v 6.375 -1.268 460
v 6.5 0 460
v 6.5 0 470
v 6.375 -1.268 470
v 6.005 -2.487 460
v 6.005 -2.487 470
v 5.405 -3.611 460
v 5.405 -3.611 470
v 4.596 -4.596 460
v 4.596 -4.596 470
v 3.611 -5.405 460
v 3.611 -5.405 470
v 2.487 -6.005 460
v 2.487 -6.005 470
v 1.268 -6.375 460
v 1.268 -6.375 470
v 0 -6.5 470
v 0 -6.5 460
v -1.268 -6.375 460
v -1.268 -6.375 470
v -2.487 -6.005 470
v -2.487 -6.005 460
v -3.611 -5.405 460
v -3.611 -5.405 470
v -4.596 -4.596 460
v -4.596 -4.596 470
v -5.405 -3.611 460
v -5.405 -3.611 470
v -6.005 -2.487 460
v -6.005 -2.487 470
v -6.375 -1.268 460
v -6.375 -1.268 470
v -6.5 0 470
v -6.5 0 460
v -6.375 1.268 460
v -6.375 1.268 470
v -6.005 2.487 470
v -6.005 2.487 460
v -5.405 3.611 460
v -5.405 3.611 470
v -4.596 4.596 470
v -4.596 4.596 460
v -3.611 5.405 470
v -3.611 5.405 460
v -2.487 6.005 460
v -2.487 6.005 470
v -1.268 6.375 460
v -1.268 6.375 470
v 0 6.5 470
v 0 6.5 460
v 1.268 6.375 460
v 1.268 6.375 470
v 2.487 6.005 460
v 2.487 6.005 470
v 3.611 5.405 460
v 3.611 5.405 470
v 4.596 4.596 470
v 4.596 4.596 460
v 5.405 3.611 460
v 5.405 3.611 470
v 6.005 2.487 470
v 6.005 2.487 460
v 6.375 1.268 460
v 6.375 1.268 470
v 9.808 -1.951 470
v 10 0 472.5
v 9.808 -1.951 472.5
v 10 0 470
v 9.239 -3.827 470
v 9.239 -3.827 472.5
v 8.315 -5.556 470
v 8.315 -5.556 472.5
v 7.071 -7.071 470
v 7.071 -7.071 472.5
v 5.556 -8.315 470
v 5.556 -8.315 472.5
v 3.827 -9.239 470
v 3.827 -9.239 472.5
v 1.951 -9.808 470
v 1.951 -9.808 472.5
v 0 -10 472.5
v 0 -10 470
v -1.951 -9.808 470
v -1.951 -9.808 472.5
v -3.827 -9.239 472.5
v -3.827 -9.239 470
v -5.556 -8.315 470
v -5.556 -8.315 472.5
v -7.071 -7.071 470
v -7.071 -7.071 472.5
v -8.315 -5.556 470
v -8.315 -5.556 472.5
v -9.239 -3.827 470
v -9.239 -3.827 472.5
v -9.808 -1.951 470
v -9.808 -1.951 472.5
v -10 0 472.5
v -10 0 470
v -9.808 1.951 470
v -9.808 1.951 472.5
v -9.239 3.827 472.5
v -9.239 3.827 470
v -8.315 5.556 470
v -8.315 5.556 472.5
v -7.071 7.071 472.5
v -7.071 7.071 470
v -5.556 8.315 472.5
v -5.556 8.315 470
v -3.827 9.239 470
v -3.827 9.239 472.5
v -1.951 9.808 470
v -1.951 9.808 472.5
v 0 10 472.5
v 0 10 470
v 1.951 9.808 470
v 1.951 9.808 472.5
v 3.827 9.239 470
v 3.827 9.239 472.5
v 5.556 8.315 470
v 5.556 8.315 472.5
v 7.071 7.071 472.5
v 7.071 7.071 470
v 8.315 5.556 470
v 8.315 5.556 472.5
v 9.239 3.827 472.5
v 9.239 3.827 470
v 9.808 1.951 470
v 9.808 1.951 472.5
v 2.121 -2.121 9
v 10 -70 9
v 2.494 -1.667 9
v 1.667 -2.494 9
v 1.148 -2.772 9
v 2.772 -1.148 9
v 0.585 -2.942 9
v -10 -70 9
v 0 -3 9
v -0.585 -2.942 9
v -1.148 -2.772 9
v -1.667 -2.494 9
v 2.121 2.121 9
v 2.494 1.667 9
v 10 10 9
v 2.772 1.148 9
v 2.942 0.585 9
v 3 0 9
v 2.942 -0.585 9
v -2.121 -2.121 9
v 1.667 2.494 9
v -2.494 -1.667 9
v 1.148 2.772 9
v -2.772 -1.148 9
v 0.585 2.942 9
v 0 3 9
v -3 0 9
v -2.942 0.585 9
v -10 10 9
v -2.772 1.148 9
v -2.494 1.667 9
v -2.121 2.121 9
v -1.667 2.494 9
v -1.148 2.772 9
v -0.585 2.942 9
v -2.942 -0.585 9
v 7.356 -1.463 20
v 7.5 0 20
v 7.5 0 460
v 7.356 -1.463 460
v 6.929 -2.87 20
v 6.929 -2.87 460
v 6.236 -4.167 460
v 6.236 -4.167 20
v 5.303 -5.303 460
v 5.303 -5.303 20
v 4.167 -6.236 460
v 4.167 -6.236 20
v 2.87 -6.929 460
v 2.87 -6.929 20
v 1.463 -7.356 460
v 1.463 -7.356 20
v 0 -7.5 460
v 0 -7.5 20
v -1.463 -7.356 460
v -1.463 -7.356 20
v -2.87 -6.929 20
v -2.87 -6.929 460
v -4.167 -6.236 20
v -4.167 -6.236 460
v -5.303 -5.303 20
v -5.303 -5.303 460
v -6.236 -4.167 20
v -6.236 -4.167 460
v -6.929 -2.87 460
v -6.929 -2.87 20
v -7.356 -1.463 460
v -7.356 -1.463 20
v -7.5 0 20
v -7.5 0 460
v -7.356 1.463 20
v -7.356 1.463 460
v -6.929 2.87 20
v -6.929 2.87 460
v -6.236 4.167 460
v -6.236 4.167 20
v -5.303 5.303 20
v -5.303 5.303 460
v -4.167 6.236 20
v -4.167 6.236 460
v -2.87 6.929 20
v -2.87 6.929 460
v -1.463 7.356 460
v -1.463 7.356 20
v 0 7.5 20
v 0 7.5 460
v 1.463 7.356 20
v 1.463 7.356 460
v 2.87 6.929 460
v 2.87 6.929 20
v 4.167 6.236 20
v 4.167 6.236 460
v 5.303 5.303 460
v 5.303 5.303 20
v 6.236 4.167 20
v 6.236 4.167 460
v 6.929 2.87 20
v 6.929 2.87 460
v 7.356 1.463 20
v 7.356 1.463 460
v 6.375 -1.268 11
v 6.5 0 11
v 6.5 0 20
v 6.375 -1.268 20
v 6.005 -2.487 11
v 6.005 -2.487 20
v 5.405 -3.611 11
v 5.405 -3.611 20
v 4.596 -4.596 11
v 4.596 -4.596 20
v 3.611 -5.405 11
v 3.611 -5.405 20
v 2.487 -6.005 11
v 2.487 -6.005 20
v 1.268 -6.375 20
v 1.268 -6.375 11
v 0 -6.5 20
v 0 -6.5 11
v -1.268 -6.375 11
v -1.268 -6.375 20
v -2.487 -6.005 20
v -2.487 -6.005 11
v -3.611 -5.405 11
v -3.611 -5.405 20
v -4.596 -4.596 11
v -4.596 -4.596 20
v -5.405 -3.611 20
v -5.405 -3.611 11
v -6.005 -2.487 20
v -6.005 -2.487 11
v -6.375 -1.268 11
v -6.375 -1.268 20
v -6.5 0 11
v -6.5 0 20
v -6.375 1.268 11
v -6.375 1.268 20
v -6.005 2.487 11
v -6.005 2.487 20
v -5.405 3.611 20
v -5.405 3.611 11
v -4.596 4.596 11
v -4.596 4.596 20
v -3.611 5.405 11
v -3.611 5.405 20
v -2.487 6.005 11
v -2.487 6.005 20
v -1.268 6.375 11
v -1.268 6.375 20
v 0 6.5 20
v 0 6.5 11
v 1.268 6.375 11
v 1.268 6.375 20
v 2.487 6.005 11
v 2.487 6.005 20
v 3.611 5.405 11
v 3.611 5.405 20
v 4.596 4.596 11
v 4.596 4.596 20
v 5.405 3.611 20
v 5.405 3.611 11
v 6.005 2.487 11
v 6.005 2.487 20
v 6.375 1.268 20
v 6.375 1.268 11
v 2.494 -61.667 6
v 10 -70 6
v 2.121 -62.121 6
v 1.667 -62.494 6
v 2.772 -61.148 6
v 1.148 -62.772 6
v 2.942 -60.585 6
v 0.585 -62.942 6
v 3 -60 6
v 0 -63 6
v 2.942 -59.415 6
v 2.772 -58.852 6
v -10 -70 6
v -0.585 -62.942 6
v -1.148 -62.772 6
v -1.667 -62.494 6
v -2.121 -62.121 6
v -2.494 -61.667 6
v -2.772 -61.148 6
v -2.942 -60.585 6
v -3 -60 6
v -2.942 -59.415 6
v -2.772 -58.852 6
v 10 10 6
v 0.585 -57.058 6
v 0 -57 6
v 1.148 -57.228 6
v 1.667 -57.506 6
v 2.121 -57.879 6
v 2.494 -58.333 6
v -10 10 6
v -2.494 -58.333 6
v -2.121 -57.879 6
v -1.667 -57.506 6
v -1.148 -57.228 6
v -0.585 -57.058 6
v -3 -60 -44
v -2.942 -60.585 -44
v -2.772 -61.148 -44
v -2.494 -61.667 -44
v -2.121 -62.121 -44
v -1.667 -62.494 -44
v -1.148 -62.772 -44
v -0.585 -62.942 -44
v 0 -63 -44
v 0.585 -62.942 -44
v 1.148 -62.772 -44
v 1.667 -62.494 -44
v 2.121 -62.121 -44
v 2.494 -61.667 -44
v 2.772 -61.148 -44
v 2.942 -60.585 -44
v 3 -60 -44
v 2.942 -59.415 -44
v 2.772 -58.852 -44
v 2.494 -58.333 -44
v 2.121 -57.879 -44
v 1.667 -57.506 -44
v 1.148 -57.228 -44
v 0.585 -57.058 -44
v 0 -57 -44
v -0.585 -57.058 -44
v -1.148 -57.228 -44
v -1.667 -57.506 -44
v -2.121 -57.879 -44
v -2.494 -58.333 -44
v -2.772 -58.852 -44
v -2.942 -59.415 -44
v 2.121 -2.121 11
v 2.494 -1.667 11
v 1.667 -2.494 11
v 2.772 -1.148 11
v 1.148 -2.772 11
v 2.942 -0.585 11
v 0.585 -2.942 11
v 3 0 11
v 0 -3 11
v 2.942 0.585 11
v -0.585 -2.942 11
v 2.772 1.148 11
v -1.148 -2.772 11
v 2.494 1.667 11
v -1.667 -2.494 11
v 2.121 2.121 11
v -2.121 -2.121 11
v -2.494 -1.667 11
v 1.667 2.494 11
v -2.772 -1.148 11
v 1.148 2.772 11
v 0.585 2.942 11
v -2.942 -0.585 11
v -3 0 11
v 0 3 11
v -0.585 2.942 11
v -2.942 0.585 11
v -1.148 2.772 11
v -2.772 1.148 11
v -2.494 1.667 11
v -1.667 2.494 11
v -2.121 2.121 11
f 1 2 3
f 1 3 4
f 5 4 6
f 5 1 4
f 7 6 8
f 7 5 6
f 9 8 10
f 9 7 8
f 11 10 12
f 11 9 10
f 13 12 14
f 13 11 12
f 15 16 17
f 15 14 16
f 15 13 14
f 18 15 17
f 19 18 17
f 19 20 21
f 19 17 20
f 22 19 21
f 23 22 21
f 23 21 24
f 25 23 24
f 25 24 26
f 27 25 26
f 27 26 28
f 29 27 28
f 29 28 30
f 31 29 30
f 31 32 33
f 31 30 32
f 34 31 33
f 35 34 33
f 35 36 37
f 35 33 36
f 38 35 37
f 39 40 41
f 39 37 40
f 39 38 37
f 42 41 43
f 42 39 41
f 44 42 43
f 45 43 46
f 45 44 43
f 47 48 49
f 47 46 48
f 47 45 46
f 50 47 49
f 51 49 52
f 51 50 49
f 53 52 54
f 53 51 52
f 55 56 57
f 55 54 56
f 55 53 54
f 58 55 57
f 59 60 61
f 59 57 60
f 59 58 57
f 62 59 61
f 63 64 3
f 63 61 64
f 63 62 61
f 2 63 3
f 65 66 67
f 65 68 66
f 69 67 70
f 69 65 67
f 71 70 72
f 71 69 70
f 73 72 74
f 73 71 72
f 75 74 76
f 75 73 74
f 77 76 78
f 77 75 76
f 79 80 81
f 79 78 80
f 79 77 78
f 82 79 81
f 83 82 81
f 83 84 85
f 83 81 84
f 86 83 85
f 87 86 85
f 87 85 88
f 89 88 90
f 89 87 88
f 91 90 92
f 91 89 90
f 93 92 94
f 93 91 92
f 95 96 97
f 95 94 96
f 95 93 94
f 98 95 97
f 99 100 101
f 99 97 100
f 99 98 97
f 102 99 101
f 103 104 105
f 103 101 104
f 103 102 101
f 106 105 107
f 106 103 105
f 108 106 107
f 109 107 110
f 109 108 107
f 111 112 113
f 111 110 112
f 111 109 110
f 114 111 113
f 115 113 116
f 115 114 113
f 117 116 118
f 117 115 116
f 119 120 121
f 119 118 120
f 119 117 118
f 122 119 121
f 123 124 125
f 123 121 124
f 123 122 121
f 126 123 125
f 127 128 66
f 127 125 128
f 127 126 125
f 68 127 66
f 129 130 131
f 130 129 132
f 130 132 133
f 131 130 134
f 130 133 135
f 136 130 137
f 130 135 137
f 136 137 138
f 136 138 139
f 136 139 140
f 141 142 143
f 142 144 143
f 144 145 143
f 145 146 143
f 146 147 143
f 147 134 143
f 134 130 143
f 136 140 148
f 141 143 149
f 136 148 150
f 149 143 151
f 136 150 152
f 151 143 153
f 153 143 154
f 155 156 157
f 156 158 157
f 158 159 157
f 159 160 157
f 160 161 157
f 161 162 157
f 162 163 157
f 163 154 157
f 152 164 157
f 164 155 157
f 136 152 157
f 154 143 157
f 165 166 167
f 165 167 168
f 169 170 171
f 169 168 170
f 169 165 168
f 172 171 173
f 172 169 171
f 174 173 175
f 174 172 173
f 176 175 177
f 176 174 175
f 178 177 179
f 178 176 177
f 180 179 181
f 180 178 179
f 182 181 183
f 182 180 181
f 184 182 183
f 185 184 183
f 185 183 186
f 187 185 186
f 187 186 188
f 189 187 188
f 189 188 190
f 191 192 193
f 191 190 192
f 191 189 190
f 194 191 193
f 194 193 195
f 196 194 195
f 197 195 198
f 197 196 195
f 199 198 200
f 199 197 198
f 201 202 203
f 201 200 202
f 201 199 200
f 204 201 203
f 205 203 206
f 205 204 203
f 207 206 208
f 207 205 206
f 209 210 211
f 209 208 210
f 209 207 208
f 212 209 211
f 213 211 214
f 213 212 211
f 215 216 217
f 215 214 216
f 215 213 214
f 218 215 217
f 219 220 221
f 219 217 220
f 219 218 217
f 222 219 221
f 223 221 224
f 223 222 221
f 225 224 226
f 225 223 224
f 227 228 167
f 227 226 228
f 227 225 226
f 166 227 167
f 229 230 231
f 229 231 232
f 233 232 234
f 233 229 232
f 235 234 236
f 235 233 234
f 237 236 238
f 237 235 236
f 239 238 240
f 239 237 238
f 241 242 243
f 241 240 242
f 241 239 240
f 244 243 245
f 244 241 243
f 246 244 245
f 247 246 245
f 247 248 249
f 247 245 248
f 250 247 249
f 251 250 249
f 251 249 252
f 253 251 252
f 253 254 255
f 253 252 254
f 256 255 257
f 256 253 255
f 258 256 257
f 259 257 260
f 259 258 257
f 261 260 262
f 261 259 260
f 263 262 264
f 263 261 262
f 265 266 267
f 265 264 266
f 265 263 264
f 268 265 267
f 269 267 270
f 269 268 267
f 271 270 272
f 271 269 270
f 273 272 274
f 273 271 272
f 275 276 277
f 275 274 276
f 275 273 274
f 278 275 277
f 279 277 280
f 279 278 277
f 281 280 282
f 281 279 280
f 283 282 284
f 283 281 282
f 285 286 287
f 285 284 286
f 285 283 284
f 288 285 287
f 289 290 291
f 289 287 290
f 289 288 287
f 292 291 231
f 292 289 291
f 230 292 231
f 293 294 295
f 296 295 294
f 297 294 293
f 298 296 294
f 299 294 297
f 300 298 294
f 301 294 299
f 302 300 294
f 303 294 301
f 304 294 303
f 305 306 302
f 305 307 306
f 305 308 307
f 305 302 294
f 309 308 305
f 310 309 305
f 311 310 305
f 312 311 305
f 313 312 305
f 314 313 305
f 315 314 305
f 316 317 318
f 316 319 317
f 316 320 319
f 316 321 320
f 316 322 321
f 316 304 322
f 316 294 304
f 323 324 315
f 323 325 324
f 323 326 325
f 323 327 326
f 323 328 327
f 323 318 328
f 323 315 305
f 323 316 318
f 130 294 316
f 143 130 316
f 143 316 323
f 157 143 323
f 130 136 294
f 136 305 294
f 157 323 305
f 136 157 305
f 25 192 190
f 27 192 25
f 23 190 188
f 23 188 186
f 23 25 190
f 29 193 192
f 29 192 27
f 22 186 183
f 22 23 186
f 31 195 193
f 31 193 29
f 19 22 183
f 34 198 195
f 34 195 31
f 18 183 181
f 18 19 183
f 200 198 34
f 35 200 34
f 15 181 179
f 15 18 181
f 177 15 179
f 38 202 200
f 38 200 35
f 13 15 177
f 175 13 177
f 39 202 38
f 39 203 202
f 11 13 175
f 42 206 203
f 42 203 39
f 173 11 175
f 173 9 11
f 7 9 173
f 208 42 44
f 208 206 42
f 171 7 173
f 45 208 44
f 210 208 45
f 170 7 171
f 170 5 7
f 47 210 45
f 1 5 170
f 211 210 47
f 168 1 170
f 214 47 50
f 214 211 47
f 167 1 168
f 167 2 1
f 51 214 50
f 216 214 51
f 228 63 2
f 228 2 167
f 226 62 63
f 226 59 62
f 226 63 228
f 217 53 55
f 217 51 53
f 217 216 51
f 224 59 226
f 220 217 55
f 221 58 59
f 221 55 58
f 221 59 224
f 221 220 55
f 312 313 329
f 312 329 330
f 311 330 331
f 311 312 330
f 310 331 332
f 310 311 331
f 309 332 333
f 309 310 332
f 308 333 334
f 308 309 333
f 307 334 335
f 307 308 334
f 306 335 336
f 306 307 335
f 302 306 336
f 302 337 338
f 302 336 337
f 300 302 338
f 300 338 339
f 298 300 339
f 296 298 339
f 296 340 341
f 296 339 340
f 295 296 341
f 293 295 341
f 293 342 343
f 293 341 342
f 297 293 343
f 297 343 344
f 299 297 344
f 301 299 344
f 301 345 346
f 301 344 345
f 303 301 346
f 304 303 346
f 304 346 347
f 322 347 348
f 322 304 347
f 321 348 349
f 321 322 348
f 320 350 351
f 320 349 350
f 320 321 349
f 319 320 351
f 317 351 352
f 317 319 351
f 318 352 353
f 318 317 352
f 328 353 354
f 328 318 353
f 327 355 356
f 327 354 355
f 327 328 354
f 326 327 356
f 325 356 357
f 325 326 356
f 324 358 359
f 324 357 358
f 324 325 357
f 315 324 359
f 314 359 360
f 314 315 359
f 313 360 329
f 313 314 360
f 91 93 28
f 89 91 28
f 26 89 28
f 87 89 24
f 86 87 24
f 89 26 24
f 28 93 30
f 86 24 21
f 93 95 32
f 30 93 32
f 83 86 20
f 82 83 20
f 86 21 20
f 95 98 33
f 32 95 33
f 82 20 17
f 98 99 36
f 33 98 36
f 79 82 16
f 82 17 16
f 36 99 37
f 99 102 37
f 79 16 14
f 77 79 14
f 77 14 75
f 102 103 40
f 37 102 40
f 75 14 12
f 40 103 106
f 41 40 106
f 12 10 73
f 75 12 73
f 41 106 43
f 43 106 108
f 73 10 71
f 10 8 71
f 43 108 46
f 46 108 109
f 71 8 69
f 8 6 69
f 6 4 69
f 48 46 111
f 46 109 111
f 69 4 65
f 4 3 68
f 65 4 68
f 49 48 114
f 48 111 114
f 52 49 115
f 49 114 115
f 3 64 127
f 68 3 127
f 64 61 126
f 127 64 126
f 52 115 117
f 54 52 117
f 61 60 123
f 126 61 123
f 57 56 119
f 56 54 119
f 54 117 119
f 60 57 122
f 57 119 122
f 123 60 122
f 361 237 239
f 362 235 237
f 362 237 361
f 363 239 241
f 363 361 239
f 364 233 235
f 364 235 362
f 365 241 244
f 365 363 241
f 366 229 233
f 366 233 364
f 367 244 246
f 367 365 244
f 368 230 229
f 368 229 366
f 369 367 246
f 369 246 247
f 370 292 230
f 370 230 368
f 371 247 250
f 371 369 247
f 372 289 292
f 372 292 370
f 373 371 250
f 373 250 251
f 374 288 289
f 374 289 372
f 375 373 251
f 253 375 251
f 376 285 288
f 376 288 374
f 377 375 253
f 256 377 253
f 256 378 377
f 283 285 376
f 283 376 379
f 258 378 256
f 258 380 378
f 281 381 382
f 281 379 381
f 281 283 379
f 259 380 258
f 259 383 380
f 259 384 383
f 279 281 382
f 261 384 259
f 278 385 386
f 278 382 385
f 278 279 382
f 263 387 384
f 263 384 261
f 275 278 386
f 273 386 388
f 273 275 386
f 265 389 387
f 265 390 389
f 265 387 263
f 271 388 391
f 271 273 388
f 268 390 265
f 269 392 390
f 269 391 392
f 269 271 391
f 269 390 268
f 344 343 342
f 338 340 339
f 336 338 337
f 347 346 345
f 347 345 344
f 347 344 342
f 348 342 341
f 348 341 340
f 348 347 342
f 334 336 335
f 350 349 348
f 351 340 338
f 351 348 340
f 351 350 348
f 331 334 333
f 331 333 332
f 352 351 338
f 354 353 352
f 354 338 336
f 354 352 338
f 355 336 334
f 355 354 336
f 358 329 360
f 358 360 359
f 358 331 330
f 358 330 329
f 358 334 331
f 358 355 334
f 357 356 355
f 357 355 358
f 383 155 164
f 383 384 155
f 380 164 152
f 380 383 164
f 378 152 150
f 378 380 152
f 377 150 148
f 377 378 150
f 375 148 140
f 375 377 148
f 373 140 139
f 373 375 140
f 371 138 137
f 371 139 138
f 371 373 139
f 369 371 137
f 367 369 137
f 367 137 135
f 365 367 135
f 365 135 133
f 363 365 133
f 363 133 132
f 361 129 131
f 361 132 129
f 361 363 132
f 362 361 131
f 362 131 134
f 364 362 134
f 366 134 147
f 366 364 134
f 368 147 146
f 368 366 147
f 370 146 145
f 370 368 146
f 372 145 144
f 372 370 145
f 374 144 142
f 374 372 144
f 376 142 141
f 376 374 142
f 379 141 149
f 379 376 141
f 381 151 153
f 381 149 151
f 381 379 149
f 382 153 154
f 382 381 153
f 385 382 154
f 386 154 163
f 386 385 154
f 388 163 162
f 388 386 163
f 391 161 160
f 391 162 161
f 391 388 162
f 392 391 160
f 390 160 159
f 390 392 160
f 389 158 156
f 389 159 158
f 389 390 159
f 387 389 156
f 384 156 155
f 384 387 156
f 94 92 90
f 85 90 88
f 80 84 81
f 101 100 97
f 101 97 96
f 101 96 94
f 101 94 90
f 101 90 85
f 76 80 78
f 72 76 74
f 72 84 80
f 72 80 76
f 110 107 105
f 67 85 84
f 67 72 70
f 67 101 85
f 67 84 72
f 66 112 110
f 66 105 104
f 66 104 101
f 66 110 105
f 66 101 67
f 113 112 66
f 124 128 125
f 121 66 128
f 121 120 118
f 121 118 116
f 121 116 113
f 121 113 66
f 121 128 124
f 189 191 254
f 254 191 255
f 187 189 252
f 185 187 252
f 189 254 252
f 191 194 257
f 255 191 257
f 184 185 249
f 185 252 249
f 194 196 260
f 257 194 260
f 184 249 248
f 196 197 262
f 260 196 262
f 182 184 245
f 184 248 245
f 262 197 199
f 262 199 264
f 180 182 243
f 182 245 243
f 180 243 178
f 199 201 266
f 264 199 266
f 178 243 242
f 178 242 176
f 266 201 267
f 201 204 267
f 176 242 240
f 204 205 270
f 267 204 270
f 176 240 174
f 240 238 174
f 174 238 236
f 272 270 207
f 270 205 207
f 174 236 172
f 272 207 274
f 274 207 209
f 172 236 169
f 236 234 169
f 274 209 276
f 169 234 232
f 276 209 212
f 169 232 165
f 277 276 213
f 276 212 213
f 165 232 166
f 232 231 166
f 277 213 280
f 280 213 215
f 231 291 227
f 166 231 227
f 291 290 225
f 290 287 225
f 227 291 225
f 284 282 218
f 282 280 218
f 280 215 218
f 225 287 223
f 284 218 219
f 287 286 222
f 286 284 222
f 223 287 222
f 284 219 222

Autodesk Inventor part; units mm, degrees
ref_plane "YZ Plane" through (0, 0, 0) normal (1, 0, 0) x (0, 1, 0)
ref_plane "XZ Plane" through (0, 0, 0) normal (0, 1, 0) x (-1, 0, 0)
ref_plane "XY Plane" through (0, 0, 0) normal (0, 0, 1) x (1, 0, 0)
sketch "Sketch1" plane through (0, 0, 0) normal (0, 0, 1) x (1, 0, 0)
  circle A0 centre (0, 0) radius 25
  dimension "d0" = 50
extrude "Extrusion1" add sketch "Sketch1" along normal blind 10
sketch "Sketch2" plane through (0, 0, 10) normal (0, 0, 1) x (1, 0, 0)
  circle A0 centre (0, 0) radius 6.5
  dimension "d3" = 13
extrude "Extrusion2" add sketch "Sketch2" along normal blind 10
fillet "Fillet1" radius 1 1 edges at (-6.5, 0, 10)
sketch "Sketch4" plane through (0, 0, 0) normal (0, 0, -1) x (-1, 0, 0)
  arc A0 (19.3649, 5) -> (5, 19.3649) centre (0, 0) ccw
  line L0 (2.5, 17.4284) -> (2.5, 9.4868)
  line L1 (9.4868, 2.5) -> (17.4284, 2.5)
  arc A1 (5, 19.3649) -> (2.5, 17.4284) centre (4.5, 17.4284) ccw
  arc A2 (17.4284, 2.5) -> (19.3649, 5) centre (17.4284, 4.5) ccw
  arc A3 (2.5, 8.3666) -> (2.5153, 8.1193) centre (4.5, 8.3666) ccw
  arc A4 (8.1193, 2.5153) -> (8.3666, 2.5) centre (8.3666, 4.5) ccw
  arc A5 (7.6798, 3.6429) -> (3.6429, 7.6798) centre (0, 0) ccw
  arc A6 (2.5, 9.4868) -> (3.6429, 7.6798) centre (4.5, 9.4868) ccw
  arc A7 (7.6798, 3.6429) -> (9.4868, 2.5) centre (9.4868, 4.5) ccw
  point P0 (2.5, 19.8431)
  point P1 (19.8431, 2.5)
  point P2 (2.5, 7.0711)
  point P3 (7.0711, 2.5)
extrude "Extrusion3" cut sketch "Sketch4" against normal blind 10
pattern_circular "Circular Pattern1" count 4 over 360 about axis through (0, 0, 11) along (0, 0, -1) of "Extrusion3"
sketch "Sketch7" plane through (0, 0, 20) normal (0, 0, 1) x (1, 0, 0)
  circle A0 centre (0, 0) radius 7.5
  dimension "d38" = 15
extrude "Extrusion5" add sketch "Sketch7" along normal blind 440
sketch "Sketch8" plane through (0, 0, 460) normal (0, 0, 1) x (1, 0, 0)
  circle A0 centre (0, 0) radius 6.5
  dimension "d41" = 13
extrude "Extrusion6" add sketch "Sketch8" along normal blind 10
sketch "Sketch9" plane through (0, 0, 470) normal (0, 0, 1) x (1, 0, 0)
  circle A0 centre (0, 0) radius 10
  dimension "d44" = 20
extrude "Extrusion7" add sketch "Sketch9" along normal blind 2.5
thread "Thread1" size "M15x1.5" class "6g" standard "ANSI Metric M Profile" length 440
sketch "Sketch10" plane through (0, 0, 0) normal (0, 0, -1) x (-1, 0, 0)
  circle A0 centre (0, 0) radius 25
extrude "Extrusion8" cut sketch "Sketch10" against normal blind 10
sketch "Sketch11" plane through (0, 0, 10) normal (0, 0, -1) x (-1, 0, 0)
  circle A0 centre (0, 0) radius 10
extrude "Extrusion9" cut sketch "Sketch11" against normal blind 1
sketch "Sketch12" plane through (0, 0, 11) normal (0, 0, -1) x (-1, 0, 0)
  circle A0 centre (0, 0) radius 3
  dimension "d53" = 6
extrude "Extrusion10" add sketch "Sketch12" along normal blind 5
sketch "Sketch13" plane through (0, 0, 6) normal (0, 0, -1) x (-1, 0, 0)
  circle A0 centre (0, 0) radius 3 projected
  circle A1 centre (0, 0) radius 3
  line L0 (-10, 10) -> (10, 10)
  line L1 (10, 10) -> (10, -70)
  line L2 (10, -70) -> (-10, -70)
  line L3 (-10, -70) -> (-10, 10)
  dimension "d56" = 80
extrude "Extrusion11" add sketch "Sketch13" against normal blind 3
sketch "Sketch14" plane through (0, 0, 6) normal (0, 0, -1) x (-1, 0, 0)
  line L0 (10, -70) -> (-10, -70) projected
  circle A0 centre (0, -60) radius 3
  point P0 (0, 0)
  dimension "d60" = 6
extrude "Extrusion12" add sketch "Sketch14" along normal blind 50
properties part number "leadscrew_modified_long" material "Steel, Alloy"
